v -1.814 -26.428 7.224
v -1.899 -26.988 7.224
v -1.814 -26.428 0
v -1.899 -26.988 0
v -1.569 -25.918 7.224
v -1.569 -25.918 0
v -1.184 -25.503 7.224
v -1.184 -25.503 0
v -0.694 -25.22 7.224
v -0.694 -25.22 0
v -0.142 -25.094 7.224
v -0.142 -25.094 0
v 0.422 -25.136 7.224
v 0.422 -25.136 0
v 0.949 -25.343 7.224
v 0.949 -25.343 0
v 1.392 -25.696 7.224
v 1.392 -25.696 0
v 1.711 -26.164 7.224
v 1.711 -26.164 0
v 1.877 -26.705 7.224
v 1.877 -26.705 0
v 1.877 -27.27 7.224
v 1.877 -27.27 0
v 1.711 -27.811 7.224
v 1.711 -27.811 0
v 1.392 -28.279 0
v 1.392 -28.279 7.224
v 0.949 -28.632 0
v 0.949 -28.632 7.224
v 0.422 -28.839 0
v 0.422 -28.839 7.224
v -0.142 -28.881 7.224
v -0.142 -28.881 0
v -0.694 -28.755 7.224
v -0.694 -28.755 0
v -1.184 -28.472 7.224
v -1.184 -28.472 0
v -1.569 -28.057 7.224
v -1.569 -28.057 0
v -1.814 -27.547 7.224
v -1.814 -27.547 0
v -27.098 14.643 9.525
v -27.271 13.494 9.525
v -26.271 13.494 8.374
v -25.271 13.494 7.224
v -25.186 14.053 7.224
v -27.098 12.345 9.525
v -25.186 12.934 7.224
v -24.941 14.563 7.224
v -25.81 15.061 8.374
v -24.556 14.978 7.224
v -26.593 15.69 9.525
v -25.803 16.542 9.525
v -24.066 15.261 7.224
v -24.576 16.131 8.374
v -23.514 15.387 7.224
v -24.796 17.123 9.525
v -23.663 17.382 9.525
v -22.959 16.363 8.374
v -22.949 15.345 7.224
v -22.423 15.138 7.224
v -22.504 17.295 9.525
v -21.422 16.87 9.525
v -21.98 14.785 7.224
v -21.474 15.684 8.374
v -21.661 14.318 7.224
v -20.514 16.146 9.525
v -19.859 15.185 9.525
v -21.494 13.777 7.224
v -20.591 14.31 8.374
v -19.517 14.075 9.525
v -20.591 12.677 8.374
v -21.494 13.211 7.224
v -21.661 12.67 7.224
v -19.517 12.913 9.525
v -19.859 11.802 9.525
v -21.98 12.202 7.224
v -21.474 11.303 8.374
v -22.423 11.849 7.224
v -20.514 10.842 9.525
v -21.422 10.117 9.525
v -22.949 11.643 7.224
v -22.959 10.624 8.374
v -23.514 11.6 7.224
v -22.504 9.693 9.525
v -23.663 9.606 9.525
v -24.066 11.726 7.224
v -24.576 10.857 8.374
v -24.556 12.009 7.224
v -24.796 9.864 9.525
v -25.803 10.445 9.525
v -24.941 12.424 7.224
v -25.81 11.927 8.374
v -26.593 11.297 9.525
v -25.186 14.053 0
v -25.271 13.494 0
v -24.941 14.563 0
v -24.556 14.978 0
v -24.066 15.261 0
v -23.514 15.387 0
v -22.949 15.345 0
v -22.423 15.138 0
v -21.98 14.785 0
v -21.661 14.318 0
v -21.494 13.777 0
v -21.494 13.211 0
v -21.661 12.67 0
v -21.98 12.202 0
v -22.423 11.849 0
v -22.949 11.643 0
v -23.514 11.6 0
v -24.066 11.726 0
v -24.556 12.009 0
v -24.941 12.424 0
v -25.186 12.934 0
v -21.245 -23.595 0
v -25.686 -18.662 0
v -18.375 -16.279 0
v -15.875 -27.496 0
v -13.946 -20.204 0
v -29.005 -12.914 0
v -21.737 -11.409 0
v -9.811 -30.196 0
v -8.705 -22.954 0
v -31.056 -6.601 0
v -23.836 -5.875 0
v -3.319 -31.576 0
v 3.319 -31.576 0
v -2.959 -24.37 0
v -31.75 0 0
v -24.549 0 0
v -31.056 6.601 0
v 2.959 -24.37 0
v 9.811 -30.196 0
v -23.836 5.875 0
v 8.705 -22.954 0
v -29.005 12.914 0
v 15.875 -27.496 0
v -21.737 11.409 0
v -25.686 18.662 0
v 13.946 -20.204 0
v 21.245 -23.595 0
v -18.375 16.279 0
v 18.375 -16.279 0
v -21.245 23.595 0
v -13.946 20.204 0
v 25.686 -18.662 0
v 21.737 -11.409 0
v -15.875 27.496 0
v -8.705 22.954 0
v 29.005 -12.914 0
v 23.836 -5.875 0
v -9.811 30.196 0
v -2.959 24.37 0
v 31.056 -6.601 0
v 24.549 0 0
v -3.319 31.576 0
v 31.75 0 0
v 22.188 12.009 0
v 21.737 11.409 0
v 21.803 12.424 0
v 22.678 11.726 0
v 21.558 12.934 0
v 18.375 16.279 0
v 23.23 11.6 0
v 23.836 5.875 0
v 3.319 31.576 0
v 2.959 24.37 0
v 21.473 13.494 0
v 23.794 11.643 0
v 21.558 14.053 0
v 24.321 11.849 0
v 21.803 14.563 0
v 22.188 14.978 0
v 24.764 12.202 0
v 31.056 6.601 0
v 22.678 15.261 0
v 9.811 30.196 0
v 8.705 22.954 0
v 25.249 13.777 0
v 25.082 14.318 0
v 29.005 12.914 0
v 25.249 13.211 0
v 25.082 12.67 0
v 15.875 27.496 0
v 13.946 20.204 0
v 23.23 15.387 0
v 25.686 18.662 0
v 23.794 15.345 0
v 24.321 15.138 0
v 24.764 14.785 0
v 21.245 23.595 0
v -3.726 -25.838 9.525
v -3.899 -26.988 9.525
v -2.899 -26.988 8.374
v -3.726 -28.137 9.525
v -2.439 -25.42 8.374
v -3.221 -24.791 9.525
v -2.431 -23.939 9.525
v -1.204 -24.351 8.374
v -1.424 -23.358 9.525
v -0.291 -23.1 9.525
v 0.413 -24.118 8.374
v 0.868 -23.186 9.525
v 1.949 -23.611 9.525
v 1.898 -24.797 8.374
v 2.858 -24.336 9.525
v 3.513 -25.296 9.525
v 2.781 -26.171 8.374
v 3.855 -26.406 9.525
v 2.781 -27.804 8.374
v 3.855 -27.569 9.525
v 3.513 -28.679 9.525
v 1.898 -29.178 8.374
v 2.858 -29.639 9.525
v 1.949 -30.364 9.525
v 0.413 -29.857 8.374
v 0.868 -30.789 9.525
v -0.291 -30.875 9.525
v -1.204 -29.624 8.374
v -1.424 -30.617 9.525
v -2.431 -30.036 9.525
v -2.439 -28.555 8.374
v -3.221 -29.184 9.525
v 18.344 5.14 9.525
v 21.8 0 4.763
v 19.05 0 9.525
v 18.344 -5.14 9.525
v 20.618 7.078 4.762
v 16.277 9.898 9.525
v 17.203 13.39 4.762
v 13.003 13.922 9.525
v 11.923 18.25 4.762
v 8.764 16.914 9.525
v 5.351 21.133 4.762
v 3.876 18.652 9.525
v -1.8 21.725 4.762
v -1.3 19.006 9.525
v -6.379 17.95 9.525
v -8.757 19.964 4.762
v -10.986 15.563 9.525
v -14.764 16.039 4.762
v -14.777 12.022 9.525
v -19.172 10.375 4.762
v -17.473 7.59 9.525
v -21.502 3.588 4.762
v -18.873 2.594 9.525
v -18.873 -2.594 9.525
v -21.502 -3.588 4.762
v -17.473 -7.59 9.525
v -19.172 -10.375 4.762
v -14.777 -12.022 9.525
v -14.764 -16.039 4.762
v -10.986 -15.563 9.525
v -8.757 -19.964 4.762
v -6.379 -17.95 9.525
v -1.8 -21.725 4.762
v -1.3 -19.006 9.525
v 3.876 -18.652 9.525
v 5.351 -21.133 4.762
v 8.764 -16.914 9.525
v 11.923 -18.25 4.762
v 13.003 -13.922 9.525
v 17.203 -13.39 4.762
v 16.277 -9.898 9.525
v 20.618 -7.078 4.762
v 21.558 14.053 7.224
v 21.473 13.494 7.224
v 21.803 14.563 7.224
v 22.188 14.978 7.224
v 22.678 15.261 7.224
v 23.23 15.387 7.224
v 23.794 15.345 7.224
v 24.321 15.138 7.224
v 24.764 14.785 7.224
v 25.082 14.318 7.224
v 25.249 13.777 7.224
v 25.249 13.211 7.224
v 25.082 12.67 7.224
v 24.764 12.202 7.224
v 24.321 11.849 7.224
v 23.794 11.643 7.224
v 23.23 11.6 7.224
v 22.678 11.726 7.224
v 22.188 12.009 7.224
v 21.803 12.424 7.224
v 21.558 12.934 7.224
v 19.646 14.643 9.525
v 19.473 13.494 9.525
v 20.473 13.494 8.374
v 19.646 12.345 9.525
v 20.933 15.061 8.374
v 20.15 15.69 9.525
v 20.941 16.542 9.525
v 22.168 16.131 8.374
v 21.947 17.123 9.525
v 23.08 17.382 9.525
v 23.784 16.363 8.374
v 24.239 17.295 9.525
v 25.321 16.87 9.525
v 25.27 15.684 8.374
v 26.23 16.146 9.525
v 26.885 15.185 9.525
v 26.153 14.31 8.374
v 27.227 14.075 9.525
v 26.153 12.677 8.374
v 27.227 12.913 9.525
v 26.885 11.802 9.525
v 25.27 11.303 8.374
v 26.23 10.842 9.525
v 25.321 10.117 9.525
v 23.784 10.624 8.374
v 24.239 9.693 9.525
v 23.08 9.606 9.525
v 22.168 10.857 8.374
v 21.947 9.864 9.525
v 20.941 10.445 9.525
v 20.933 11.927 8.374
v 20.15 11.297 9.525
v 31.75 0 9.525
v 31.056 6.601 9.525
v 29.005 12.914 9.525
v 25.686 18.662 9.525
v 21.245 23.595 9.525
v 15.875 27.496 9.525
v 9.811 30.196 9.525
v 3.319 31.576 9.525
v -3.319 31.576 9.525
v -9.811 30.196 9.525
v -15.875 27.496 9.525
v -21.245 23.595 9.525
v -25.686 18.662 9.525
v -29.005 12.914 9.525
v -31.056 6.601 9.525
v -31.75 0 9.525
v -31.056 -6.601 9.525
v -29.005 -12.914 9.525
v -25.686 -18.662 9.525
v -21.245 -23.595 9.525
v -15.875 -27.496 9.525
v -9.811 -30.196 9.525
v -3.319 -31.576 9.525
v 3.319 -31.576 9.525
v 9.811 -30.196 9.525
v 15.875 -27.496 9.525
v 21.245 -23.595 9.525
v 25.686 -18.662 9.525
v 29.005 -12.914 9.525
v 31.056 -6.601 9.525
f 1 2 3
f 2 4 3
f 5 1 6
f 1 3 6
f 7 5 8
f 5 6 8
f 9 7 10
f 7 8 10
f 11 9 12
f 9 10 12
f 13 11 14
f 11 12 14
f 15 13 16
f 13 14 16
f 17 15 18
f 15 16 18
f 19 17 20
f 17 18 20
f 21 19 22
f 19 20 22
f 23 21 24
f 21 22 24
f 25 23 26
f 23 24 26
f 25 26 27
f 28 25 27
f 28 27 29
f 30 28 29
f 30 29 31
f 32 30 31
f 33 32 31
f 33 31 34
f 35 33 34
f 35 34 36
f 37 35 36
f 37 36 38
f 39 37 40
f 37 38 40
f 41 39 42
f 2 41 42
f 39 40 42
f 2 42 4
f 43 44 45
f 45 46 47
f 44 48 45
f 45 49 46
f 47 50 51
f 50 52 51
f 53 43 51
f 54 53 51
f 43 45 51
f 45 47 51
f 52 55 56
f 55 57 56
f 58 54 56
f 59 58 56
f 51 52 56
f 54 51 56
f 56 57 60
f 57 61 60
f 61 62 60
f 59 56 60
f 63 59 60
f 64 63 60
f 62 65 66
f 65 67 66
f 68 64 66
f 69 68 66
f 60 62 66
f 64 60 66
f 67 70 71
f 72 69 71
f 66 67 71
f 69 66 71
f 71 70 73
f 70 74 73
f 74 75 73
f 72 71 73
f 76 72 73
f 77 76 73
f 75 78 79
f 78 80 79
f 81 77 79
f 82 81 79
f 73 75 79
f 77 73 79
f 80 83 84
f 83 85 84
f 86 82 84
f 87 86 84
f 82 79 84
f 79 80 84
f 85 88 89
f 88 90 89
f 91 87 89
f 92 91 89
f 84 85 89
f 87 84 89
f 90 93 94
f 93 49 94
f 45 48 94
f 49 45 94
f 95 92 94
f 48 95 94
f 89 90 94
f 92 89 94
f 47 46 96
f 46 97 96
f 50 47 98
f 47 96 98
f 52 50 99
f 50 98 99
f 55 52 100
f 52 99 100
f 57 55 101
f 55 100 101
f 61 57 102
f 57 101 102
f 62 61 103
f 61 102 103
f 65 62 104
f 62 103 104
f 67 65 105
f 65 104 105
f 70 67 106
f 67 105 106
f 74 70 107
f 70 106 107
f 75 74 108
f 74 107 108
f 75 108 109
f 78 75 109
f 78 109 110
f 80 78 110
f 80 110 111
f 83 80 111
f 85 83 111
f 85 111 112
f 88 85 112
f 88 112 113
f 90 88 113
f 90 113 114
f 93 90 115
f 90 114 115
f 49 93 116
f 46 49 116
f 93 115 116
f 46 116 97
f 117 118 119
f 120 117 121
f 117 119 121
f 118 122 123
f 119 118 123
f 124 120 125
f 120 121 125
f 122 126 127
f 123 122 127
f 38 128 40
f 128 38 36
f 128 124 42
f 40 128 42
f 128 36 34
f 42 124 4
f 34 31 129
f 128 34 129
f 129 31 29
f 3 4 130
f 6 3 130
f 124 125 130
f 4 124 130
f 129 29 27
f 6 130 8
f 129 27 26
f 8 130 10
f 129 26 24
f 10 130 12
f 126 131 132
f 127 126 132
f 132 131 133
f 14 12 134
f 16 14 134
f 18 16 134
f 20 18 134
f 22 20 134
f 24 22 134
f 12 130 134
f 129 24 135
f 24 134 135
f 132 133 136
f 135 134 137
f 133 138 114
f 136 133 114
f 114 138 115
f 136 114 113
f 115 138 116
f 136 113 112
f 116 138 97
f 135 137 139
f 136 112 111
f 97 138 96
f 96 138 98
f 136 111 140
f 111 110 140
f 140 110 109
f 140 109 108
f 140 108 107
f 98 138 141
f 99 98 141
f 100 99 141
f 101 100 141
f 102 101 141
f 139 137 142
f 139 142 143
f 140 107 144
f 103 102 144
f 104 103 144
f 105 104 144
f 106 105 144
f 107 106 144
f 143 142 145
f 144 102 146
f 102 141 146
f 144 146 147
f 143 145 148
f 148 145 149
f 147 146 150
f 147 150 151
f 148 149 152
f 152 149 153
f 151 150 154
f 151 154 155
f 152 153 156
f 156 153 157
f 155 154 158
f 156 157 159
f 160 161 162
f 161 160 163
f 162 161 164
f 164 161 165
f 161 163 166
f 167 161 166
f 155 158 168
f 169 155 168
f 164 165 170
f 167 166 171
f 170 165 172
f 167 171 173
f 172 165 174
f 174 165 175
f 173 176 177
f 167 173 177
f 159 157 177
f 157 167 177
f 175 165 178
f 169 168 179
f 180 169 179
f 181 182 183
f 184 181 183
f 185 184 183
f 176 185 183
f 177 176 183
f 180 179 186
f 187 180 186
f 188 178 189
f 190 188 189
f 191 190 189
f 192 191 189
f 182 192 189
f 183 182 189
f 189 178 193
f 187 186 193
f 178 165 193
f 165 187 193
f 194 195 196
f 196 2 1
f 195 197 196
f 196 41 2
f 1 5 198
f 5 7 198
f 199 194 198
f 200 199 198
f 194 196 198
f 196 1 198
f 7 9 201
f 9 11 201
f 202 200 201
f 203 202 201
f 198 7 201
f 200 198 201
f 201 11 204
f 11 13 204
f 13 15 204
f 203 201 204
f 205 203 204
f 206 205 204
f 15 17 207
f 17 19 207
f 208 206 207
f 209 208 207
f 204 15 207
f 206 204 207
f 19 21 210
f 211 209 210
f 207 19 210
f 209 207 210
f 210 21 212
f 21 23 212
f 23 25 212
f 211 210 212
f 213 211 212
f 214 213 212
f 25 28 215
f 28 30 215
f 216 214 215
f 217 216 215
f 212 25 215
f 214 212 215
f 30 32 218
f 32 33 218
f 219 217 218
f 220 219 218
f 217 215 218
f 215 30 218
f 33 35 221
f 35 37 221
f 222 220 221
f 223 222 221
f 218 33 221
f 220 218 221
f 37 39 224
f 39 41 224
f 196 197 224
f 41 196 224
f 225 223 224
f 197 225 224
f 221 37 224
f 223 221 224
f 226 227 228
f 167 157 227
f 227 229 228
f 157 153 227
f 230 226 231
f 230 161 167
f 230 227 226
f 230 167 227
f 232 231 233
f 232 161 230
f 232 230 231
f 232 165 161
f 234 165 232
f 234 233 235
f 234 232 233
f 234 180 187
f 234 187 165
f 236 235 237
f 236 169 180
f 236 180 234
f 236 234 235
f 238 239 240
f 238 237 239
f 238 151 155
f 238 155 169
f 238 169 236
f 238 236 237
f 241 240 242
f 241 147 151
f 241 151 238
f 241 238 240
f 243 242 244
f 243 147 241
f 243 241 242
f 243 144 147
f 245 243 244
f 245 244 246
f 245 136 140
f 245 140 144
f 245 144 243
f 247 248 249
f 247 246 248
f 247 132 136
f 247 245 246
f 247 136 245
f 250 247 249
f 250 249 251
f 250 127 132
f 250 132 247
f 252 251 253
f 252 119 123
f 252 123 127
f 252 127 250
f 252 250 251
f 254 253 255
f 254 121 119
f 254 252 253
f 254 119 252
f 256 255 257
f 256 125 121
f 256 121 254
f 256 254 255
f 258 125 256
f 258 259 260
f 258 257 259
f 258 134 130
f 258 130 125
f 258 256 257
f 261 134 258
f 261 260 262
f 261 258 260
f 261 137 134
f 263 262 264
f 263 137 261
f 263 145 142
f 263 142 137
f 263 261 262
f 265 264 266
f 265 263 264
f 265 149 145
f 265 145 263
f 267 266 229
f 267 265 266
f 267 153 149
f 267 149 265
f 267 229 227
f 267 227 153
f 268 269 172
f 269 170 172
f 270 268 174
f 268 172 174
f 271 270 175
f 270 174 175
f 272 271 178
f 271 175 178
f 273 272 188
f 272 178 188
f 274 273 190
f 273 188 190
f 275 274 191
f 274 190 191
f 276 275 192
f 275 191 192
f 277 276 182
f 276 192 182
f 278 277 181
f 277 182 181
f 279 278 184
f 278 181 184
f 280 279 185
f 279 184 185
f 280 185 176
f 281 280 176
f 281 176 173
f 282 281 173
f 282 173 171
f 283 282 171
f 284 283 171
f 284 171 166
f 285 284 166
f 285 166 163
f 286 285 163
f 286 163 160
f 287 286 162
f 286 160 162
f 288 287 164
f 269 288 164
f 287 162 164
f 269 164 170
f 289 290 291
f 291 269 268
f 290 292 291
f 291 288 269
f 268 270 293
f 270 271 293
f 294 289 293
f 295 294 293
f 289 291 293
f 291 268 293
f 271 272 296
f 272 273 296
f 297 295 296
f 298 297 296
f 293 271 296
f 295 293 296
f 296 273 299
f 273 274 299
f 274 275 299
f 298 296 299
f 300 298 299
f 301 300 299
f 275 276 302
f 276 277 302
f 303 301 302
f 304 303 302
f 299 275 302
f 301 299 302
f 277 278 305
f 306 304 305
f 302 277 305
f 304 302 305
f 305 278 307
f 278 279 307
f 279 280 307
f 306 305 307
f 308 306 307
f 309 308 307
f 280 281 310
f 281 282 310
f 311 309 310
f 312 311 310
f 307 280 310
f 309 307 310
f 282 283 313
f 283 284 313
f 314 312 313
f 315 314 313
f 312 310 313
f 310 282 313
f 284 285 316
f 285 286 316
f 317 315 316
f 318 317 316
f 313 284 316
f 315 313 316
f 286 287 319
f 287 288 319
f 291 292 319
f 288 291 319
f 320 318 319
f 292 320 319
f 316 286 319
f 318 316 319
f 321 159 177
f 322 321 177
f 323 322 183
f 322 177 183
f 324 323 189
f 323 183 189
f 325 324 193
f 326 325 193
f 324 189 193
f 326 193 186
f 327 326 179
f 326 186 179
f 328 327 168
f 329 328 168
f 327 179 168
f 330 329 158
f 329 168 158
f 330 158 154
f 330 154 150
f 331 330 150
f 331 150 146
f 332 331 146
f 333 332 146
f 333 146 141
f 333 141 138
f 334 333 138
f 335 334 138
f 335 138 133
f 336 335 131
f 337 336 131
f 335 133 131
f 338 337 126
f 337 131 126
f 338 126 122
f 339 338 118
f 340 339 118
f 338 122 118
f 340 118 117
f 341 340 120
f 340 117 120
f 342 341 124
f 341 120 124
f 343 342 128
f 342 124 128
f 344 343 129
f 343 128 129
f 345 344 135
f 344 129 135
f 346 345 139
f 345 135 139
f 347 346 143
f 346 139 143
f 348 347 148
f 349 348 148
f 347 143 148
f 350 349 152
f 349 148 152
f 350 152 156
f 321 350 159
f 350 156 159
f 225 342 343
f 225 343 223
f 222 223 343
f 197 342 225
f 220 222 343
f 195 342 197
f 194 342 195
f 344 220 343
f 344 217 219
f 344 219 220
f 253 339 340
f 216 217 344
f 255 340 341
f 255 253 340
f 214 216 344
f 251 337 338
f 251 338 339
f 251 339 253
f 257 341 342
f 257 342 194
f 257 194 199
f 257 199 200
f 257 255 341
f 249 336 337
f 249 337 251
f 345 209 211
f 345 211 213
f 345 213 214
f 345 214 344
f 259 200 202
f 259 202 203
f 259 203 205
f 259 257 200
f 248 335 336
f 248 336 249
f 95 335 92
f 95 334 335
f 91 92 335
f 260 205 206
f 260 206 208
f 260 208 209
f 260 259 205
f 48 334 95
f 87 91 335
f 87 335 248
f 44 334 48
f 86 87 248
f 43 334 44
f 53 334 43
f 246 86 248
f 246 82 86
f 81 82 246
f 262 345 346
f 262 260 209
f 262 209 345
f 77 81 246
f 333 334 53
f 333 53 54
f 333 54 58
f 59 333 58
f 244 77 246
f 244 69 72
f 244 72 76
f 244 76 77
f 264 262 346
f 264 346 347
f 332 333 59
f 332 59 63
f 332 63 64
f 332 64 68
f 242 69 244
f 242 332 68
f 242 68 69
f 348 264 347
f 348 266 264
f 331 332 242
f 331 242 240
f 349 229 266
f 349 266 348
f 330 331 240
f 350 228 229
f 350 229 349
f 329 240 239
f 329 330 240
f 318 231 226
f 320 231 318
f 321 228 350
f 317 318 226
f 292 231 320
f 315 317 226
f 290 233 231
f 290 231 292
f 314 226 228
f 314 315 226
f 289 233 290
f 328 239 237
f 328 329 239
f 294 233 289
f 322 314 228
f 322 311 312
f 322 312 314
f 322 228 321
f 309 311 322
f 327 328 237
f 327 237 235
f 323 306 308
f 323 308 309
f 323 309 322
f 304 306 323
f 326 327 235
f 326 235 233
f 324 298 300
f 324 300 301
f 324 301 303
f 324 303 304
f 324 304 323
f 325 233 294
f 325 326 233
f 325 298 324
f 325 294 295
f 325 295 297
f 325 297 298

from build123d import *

# Parameters (mm, degrees)
F0_R           = 31.75
F1_DEPTH       = 9.525
F2_R           = 19.05
F3_DEPTH       = 25.4
F3_TAPER       = -30
F5_D           = 3.7973
F5_CSINK_D     = 7.7978
F5_CSINK_ANGLE = 82


with BuildPart() as f1:
    # F0 (on Top) → F1 (new body)
    with BuildSketch(Plane.XY):
        Circle(F0_R)
    extrude(amount=F1_DEPTH)

    # F2 (on face) → F3 (cut)
    with BuildSketch(Plane.XY.offset(9.525)):
        Circle(F2_R)
    extrude(amount=-F3_DEPTH, taper=F3_TAPER, mode=Mode.SUBTRACT)

    # F5 (through all)
    with Locations(Plane.XY.offset(9.525)):
        with Locations((-23.3718605846, 13.49375), (23.3718605846, 13.49375), (0, -26.9875)):
            CounterSinkHole(F5_D / 2, F5_CSINK_D / 2, counter_sink_angle=F5_CSINK_ANGLE)


solid = f1.part
